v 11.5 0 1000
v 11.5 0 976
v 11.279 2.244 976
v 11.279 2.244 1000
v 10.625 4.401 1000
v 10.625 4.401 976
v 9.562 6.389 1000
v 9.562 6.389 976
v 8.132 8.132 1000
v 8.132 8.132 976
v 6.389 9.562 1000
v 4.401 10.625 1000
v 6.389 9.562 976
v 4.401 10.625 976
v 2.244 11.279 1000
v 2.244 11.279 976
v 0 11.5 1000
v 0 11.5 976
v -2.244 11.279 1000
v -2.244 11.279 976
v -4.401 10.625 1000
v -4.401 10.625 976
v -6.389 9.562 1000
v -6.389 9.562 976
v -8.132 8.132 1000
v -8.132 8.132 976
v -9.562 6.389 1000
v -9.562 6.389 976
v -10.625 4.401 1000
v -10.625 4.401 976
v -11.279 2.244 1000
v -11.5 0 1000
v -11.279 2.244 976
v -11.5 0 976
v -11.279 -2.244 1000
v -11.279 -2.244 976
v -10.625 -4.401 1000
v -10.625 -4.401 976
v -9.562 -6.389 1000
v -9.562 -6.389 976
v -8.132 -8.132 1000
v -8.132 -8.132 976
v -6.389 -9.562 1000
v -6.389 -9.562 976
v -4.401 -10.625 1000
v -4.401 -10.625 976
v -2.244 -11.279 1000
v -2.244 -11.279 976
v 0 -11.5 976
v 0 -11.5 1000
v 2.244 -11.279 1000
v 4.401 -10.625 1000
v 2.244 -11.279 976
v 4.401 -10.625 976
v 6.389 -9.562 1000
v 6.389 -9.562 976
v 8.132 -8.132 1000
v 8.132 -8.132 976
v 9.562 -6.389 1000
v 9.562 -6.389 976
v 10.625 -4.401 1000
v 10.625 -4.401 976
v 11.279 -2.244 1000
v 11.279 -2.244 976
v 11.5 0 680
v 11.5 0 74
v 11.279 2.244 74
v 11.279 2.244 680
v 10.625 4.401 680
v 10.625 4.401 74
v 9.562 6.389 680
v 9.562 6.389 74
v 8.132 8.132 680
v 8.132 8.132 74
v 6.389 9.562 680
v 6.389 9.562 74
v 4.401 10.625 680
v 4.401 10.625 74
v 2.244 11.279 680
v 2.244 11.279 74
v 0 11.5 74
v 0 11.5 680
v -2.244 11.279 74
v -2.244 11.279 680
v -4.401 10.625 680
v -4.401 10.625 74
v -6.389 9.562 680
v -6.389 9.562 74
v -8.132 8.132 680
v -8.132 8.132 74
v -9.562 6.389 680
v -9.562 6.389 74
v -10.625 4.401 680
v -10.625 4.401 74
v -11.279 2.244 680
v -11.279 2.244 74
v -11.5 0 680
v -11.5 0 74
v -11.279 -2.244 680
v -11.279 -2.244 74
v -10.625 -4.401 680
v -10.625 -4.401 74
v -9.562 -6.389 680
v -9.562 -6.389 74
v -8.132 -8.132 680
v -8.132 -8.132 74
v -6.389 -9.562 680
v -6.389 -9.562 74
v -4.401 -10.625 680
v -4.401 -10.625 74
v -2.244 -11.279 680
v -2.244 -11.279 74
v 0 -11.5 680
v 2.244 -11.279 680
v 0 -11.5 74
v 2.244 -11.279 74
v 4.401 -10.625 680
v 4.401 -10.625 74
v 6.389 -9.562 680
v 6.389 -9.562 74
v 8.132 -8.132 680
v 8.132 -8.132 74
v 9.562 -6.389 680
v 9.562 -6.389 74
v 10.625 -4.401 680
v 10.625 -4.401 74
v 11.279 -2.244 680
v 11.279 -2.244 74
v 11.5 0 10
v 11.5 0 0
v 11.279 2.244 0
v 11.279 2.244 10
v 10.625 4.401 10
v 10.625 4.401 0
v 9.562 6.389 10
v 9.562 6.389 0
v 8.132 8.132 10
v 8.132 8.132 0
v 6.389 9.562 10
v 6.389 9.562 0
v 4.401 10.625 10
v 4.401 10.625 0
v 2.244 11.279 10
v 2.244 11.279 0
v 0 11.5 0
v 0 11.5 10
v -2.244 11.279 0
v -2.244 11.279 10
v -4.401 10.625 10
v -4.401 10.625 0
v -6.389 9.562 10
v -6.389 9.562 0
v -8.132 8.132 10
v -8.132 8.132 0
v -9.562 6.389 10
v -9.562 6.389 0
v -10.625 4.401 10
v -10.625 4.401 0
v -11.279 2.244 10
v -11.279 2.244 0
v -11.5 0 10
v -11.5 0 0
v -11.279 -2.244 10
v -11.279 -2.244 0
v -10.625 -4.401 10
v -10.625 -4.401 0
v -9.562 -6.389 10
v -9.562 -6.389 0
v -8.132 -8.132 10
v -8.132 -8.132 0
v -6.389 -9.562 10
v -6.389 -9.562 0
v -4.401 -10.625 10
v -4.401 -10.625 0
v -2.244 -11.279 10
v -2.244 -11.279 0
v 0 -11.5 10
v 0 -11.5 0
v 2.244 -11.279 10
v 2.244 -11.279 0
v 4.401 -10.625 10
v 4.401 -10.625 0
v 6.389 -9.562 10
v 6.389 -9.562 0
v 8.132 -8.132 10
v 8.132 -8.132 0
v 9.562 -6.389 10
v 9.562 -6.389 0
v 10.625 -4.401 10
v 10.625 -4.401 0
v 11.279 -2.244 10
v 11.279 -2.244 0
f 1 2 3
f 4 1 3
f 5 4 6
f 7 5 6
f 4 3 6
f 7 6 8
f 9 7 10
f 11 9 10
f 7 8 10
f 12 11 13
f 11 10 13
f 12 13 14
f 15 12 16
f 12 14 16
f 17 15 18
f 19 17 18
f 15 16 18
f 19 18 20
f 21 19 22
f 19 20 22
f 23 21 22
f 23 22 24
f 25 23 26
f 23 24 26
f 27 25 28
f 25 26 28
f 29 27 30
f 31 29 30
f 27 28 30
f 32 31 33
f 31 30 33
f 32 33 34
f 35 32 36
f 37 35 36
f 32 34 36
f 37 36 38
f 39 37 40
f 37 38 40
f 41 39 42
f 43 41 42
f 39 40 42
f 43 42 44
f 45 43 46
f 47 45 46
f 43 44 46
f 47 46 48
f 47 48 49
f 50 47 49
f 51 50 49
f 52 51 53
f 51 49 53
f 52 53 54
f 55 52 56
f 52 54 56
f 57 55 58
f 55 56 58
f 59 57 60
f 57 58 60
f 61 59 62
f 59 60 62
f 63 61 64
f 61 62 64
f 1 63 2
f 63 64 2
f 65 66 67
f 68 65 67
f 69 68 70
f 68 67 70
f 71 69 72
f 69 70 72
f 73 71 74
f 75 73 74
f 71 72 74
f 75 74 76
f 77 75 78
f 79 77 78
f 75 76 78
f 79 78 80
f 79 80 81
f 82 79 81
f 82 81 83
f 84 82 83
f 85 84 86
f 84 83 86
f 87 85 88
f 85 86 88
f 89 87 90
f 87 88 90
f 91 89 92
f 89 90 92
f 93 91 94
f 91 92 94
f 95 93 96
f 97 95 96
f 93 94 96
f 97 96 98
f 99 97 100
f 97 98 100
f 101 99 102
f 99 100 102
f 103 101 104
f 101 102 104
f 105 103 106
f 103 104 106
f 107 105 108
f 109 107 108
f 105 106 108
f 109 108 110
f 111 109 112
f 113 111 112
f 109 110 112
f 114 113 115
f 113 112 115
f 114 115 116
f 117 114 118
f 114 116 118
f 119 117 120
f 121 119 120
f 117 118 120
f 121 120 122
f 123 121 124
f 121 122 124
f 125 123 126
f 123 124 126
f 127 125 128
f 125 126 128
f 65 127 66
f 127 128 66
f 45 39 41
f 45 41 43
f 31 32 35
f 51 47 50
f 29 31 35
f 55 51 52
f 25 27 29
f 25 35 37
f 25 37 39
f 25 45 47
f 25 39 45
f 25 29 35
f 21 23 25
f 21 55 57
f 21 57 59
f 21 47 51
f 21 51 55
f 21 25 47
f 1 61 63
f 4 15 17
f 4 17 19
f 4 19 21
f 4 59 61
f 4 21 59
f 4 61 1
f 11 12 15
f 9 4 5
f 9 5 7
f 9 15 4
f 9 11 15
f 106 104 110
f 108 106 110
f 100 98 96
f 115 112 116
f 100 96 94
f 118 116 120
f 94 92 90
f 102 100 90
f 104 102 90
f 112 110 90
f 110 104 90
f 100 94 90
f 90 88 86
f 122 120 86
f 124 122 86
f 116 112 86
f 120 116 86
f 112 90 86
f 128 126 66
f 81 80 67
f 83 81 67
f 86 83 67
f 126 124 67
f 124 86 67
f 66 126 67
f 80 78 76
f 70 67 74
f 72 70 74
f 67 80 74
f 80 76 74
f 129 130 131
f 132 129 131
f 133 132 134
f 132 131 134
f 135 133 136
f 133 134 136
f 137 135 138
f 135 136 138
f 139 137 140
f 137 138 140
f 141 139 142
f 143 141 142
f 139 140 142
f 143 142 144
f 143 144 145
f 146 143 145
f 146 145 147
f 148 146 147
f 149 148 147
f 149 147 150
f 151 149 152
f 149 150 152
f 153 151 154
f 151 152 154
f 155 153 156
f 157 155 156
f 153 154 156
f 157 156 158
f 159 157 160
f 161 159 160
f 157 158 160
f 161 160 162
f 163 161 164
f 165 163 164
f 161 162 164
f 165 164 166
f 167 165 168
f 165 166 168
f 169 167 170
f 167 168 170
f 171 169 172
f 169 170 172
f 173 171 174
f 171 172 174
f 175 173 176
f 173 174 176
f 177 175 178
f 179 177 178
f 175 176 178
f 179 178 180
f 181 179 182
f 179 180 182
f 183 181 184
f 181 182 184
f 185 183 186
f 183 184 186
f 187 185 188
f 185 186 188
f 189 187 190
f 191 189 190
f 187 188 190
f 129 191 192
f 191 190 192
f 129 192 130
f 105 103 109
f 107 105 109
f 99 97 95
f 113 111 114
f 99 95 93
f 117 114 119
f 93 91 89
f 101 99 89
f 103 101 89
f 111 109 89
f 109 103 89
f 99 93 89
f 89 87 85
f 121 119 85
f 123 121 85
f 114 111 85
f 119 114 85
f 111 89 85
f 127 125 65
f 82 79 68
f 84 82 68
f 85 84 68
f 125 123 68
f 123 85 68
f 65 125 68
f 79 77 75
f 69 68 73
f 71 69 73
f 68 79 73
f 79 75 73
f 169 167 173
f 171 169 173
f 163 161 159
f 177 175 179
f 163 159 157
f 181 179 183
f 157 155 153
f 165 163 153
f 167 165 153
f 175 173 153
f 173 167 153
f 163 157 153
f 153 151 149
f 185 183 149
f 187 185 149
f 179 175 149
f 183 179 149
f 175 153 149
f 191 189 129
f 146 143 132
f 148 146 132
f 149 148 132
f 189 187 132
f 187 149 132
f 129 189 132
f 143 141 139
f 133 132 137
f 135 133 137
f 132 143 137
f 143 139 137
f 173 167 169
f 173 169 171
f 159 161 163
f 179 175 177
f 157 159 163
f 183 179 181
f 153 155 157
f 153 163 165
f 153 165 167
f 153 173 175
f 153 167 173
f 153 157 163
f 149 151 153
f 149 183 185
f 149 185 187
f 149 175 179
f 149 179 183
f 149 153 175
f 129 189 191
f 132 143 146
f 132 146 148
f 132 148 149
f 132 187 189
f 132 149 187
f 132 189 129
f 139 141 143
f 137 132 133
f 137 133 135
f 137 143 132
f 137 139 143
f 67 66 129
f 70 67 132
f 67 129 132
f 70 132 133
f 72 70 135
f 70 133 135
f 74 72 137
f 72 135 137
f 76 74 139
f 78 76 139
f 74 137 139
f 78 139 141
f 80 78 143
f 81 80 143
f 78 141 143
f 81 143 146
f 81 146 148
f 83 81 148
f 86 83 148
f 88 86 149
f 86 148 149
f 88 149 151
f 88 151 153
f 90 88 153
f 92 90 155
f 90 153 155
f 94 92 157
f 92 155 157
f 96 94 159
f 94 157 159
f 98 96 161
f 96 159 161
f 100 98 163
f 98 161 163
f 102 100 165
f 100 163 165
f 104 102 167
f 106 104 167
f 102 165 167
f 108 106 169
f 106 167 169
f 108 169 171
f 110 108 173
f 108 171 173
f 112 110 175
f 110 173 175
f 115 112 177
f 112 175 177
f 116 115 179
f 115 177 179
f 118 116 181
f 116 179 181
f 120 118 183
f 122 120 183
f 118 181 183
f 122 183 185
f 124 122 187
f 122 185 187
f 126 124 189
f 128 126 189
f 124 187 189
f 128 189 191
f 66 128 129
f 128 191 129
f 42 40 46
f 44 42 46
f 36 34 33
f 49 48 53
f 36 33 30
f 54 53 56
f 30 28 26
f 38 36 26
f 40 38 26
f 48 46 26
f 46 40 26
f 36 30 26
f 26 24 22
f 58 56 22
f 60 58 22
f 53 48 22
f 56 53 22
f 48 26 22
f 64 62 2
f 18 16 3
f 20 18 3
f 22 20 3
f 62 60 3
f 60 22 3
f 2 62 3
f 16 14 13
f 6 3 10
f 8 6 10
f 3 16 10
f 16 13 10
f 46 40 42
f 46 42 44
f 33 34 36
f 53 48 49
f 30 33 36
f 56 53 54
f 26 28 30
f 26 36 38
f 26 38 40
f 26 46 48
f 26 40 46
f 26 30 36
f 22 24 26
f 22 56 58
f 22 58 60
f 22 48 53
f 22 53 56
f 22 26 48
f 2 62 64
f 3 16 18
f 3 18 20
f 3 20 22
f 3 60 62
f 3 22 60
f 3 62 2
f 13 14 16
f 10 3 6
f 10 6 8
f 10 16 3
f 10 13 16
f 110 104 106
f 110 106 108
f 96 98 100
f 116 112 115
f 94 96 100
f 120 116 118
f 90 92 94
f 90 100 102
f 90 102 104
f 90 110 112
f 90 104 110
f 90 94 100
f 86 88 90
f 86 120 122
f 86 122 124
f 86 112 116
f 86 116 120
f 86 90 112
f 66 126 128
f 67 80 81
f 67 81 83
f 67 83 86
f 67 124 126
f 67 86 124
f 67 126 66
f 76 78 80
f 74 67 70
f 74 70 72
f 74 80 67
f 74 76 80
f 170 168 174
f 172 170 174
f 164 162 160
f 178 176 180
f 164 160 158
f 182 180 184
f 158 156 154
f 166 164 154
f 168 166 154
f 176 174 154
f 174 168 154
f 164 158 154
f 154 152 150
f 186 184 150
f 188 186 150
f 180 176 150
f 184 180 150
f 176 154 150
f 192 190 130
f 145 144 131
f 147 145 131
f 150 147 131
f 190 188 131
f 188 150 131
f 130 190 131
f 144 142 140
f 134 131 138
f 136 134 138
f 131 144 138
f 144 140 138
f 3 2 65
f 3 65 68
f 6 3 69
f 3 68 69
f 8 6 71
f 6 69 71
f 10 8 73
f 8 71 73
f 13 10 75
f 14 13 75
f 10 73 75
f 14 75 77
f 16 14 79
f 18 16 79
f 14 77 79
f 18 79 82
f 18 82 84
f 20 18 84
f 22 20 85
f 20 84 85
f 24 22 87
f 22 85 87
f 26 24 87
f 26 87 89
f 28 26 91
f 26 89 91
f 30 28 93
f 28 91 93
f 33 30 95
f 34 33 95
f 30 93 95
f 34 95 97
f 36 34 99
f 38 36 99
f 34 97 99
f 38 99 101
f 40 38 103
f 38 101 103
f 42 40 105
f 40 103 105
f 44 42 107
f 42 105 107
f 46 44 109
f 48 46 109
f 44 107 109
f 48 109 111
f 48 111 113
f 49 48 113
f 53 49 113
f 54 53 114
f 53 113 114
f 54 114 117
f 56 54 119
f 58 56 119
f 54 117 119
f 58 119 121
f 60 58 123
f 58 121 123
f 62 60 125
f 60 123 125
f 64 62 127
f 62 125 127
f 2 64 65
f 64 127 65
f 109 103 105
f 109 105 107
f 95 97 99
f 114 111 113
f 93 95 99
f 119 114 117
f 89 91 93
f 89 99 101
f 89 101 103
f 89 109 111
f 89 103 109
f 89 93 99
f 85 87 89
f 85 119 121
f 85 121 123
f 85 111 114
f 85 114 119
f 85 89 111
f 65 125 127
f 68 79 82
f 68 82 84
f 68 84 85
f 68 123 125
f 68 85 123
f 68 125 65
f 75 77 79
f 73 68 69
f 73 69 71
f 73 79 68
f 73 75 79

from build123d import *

# Parameters (mm, degrees)
F0_R      = 11.5
F1_DEPTH  = 10
F3_R      = 11.5
F4_DEPTH  = 64
F6_R      = 11.5
F7_DEPTH  = 606
F9_R      = 11.5
F10_DEPTH = 296
F12_R     = 11.5
F13_DEPTH = 24


with BuildPart() as f1:
    # F0 (on Top) → F1 (new body)
    with BuildSketch(Plane.XY):
        Circle(F0_R)
    extrude(amount=F1_DEPTH)


with BuildPart() as f4:
    # F3 (on offset) → F4 (new body)
    with BuildSketch(Plane.XY.offset(10)):
        Circle(F3_R)
    extrude(amount=F4_DEPTH)


with BuildPart() as f7:
    # F6 (on offset) → F7 (new body)
    with BuildSketch(Plane.XY.offset(74)):
        Circle(F6_R)
    extrude(amount=F7_DEPTH)


with BuildPart() as f10:
    # F9 (on offset) → F10 (new body)
    with BuildSketch(Plane.XY.offset(680)):
        Circle(F9_R)
    extrude(amount=F10_DEPTH)


with BuildPart() as f13:
    # F12 (on offset) → F13 (new body)
    with BuildSketch(Plane.XY.offset(976)):
        Circle(F12_R)
    extrude(amount=F13_DEPTH)


solid = Compound([f1.part, f4.part, f7.part, f10.part, f13.part])
